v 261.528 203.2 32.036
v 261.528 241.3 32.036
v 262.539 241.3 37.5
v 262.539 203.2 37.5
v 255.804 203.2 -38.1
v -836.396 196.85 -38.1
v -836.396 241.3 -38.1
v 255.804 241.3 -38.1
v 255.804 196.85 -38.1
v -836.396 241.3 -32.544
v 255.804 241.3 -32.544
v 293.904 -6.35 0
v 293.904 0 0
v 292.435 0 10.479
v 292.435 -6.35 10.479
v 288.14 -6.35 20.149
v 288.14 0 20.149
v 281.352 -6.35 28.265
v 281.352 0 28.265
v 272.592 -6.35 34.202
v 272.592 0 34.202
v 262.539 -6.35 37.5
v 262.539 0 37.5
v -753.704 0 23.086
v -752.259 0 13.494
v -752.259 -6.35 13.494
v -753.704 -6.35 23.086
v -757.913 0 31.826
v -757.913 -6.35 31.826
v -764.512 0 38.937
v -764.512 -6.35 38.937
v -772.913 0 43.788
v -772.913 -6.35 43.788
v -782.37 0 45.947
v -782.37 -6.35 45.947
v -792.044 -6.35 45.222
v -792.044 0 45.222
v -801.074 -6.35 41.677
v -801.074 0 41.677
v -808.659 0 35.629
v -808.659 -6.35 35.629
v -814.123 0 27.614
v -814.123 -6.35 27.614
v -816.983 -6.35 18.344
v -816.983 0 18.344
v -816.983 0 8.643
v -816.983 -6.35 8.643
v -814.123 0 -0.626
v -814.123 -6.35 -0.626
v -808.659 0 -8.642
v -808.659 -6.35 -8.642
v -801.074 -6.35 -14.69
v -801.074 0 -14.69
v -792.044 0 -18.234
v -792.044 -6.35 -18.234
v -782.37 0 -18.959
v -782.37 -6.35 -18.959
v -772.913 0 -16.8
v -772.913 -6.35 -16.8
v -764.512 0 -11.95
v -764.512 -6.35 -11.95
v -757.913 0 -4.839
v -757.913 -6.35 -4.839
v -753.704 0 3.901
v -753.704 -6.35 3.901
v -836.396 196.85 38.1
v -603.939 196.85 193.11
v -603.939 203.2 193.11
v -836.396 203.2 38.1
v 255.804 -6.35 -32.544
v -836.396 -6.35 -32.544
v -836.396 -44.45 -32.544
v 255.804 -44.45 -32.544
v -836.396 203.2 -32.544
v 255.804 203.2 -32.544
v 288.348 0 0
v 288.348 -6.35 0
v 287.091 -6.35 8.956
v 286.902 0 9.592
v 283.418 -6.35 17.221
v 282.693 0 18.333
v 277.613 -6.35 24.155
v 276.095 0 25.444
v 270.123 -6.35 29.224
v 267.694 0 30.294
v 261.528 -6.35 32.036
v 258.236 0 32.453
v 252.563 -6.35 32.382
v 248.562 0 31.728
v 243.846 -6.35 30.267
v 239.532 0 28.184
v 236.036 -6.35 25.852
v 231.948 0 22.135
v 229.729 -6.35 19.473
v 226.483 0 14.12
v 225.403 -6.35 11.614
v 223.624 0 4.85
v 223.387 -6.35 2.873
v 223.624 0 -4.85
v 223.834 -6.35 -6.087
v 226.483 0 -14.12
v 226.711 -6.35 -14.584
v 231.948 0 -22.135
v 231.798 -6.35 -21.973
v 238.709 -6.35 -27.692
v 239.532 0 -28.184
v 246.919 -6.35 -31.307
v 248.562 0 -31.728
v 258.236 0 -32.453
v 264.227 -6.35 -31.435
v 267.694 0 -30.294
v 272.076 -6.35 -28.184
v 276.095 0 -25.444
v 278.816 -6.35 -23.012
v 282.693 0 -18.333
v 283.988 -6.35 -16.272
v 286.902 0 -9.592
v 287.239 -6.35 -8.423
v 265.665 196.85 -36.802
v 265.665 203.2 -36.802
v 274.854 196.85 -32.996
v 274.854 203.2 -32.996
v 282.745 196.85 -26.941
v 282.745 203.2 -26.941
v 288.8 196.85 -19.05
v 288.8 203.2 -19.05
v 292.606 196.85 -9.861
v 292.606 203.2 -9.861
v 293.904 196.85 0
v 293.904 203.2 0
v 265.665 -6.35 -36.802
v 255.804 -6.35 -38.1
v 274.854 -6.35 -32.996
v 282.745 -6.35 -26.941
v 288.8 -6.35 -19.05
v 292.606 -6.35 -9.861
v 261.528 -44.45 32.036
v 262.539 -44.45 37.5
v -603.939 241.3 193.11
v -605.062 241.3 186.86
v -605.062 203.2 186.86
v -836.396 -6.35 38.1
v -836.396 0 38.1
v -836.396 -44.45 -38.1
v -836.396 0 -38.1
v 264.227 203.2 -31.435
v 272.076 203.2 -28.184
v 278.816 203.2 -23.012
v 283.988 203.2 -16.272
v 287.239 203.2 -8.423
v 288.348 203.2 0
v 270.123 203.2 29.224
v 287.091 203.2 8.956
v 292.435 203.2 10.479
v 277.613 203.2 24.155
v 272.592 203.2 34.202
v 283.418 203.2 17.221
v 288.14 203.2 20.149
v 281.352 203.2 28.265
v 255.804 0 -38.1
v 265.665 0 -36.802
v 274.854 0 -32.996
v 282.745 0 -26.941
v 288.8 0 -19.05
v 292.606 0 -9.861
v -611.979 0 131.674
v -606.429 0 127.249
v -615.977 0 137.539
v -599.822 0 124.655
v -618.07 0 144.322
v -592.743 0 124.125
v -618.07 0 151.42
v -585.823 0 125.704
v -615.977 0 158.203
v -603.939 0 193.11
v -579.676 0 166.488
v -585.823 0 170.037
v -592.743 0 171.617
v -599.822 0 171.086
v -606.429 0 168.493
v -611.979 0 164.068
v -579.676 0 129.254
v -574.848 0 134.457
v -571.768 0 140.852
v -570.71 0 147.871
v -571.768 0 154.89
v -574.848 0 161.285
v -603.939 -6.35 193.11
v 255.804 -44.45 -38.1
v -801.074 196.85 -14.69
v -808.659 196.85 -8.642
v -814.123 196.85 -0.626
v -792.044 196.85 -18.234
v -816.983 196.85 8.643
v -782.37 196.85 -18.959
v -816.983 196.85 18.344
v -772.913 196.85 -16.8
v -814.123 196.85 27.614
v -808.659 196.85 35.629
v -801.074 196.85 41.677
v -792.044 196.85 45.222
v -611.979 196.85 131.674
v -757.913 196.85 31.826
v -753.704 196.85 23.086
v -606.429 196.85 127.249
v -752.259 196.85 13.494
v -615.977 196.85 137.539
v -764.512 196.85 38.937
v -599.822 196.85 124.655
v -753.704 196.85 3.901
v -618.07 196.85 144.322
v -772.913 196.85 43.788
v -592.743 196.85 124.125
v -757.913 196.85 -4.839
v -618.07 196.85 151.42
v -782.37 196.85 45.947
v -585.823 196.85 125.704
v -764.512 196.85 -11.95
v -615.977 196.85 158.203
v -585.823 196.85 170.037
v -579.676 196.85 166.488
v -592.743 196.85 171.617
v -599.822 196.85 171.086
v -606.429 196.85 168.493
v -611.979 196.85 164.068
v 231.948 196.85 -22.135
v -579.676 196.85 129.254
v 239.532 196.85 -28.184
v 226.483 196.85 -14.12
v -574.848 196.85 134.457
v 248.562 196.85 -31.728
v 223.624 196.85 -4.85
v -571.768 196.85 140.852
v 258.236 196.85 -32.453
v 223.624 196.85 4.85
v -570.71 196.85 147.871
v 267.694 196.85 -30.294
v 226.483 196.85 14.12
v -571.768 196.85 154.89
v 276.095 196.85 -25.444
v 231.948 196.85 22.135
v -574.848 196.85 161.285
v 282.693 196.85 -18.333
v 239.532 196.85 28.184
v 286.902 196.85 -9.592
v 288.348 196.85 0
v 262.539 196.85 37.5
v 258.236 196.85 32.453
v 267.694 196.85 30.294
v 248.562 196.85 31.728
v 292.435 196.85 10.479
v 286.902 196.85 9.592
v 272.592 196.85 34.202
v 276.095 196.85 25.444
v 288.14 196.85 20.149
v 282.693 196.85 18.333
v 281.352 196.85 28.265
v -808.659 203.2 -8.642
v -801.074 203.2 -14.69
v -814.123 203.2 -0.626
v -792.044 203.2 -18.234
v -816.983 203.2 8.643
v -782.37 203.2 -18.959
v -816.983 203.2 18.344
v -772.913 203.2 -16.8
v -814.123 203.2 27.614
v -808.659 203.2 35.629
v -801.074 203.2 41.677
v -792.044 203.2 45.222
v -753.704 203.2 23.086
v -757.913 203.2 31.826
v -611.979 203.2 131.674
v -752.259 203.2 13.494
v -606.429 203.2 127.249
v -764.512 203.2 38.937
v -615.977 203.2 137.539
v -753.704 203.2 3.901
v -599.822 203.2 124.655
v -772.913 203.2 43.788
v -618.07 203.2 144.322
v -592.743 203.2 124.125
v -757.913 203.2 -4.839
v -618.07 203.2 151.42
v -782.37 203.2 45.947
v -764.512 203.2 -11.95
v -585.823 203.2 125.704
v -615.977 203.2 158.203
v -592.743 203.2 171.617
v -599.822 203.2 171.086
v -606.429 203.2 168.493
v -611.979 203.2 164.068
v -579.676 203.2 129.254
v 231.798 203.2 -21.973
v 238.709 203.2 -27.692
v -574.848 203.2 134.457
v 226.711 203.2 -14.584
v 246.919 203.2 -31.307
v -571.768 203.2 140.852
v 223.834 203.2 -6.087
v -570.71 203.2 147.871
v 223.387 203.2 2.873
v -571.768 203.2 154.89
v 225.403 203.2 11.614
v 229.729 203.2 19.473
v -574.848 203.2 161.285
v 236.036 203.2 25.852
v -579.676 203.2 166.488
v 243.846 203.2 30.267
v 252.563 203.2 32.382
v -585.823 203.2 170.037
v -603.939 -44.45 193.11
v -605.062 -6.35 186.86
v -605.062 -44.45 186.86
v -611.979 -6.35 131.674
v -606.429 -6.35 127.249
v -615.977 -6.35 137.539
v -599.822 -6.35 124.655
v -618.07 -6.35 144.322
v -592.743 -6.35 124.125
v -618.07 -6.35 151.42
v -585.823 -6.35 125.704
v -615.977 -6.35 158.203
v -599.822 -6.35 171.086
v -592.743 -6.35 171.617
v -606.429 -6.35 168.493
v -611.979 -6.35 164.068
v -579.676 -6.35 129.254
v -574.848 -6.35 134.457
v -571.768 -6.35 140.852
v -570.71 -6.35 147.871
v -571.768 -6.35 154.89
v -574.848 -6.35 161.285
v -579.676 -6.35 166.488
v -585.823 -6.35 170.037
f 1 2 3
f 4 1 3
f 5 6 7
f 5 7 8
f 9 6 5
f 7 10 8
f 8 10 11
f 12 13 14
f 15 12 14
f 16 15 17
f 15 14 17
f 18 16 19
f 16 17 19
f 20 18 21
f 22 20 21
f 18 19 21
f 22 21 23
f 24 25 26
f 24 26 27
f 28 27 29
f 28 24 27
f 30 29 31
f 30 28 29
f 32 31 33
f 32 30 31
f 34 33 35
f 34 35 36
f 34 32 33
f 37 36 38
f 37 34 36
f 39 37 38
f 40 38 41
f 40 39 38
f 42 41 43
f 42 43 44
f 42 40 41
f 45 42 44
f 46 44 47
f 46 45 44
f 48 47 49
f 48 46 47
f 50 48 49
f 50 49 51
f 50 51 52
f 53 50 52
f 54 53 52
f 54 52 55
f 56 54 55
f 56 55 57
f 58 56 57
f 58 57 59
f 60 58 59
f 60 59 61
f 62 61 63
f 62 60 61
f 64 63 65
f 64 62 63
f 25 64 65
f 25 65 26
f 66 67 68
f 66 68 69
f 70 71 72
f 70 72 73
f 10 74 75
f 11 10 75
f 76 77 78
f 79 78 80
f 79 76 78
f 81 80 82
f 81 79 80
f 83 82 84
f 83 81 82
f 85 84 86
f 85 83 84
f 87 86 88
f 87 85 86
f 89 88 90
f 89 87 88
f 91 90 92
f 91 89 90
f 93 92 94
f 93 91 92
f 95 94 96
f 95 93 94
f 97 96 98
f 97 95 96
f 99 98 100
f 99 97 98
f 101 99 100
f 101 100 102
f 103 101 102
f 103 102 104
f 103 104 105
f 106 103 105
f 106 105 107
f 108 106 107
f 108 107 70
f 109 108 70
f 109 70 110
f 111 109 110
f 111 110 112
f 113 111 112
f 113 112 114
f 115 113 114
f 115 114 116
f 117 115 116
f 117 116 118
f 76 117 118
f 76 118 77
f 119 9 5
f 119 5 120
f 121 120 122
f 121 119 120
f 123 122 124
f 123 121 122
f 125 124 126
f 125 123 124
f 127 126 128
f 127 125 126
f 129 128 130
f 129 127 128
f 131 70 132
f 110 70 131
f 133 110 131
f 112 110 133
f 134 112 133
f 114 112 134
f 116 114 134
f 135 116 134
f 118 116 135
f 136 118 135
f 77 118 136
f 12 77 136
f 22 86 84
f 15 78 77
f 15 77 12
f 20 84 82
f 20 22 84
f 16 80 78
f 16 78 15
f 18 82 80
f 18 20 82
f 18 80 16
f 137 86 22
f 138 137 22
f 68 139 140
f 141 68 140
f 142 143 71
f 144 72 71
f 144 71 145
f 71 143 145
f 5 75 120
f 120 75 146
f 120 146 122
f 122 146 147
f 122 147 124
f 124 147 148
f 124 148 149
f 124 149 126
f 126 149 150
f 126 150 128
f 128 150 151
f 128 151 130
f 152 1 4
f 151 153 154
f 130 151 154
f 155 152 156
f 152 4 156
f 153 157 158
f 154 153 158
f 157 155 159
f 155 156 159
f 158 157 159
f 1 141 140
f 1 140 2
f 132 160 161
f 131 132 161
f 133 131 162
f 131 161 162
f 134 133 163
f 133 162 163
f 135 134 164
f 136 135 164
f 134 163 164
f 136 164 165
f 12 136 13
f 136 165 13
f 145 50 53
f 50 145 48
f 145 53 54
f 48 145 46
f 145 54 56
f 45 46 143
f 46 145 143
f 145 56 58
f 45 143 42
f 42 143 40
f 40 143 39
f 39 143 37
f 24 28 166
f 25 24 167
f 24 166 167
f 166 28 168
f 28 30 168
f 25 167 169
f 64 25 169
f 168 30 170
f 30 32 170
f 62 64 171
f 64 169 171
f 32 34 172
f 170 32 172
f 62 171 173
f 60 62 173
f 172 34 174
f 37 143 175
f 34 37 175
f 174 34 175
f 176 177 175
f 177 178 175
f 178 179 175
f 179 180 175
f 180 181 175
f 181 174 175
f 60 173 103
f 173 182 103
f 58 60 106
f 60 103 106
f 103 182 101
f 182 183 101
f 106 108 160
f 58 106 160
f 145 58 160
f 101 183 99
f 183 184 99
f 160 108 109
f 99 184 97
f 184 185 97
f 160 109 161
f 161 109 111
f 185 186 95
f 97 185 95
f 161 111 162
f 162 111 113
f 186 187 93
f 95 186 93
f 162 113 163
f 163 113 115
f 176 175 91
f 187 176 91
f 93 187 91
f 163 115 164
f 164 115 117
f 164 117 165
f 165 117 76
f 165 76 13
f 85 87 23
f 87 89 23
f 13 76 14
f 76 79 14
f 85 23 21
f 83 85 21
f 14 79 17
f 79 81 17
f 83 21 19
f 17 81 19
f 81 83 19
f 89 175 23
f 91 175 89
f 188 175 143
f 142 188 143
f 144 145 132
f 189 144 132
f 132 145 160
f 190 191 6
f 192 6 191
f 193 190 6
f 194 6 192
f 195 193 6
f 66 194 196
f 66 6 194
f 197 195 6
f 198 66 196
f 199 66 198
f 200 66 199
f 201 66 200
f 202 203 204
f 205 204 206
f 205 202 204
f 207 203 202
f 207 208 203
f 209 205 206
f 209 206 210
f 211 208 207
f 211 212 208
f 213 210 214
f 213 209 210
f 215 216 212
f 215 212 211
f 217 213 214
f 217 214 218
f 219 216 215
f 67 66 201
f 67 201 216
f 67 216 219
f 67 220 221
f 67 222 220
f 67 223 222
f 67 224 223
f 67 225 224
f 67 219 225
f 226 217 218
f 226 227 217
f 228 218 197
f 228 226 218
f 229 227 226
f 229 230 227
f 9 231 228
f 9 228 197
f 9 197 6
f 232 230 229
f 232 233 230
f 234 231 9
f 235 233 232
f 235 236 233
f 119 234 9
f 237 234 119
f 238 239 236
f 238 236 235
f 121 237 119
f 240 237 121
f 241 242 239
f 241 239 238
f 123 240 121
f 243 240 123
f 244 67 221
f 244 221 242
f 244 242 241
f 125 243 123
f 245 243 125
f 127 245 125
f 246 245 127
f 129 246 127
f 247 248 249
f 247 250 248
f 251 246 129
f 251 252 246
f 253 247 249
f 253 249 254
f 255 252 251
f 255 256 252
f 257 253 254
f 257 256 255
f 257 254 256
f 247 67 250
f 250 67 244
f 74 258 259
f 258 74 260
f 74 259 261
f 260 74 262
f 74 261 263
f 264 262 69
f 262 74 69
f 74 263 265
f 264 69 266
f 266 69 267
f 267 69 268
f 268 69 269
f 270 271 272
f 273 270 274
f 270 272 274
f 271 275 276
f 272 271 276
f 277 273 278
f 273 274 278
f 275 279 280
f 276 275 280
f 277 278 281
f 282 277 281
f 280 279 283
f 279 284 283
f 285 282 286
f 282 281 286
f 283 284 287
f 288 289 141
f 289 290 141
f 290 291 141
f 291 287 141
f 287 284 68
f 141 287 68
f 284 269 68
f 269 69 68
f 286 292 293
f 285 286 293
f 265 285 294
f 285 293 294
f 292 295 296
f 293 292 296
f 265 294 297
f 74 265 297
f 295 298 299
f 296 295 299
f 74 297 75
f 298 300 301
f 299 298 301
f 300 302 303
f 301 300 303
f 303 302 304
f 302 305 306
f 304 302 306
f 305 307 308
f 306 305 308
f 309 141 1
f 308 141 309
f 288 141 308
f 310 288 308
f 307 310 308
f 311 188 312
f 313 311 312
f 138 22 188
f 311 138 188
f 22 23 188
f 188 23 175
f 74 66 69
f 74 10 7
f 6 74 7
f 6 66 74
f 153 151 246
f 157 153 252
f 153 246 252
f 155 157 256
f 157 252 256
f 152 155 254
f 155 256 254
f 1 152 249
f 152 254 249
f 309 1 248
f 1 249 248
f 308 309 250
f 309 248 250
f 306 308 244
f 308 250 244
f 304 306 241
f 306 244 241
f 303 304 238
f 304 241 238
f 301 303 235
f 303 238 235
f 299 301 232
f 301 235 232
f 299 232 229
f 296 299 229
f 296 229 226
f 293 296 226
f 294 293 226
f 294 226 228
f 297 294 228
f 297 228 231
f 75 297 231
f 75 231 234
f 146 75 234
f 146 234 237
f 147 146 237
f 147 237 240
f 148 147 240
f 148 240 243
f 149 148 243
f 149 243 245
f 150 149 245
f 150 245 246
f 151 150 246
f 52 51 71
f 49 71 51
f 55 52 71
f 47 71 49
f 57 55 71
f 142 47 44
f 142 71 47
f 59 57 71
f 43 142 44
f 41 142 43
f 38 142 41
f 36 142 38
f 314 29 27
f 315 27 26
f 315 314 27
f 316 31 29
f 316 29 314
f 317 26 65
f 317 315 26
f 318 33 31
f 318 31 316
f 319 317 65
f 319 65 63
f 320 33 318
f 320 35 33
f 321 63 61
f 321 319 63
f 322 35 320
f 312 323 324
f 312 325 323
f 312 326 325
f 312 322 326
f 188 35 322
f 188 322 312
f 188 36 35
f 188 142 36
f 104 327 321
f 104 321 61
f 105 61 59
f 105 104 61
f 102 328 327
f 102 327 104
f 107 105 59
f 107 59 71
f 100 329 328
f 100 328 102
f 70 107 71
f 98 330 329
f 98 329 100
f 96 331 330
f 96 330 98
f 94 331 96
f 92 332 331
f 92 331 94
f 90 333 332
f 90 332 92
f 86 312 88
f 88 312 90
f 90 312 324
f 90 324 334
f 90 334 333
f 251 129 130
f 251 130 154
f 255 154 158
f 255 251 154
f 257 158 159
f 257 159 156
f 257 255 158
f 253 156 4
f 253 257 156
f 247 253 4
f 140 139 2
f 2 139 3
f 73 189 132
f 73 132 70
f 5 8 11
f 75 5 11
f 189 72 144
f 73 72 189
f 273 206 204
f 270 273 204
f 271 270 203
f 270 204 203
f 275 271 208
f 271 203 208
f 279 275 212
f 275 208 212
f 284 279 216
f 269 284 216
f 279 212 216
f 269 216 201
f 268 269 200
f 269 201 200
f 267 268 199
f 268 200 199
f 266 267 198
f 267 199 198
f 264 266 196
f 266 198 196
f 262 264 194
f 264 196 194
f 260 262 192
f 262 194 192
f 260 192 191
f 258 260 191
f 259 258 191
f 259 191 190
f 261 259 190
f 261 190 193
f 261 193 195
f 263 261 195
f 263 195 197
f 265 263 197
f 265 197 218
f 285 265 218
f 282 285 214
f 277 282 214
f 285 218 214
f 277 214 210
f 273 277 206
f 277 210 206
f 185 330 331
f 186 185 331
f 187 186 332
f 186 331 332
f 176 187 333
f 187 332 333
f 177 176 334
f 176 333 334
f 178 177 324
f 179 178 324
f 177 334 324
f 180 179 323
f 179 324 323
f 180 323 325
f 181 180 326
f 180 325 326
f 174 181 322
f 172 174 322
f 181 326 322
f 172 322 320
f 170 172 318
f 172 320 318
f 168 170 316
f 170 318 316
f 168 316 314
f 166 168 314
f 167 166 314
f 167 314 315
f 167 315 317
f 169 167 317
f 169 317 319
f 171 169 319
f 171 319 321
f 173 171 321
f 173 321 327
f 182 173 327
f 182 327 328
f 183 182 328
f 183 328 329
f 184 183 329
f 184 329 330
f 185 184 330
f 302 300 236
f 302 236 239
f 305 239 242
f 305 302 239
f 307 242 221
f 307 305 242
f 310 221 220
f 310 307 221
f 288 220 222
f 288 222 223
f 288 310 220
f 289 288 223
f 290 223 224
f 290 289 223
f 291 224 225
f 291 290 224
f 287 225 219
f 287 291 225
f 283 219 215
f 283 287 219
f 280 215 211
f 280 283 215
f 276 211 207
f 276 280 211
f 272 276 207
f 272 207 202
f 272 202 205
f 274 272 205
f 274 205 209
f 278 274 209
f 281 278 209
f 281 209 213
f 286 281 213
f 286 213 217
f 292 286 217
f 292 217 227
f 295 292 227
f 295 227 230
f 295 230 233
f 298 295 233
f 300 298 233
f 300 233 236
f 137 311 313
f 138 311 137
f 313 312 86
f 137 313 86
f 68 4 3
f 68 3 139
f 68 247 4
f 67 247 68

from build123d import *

# Parameters (mm, degrees)
F0_R          = 32.54375
F1_DEPTH      = 6.35
F2_R          = 23.8125
F2_W          = 1092.2
F2_H          = 5.55625
F3_DEPTH      = 38.1
F4_DEPTH      = 25.4
F4_DEPTH_BACK = 76.2


with BuildPart() as f1:
    # F0 (on Front) → F1 (new body)
    with BuildSketch(Plane.XZ):
        with BuildLine():
            ThreePointArc((255.8039750737, -38.1), (217.8542547268, 3.3806398206), (262.538585876, 37.5000668978))
            Line((262.538585876, 37.5000668978), (-603.9391503229, 193.1101978891))
            Line((-603.9391503229, 193.1101978891), (-836.3960249263, 38.1))
            Line((-836.3960249263, 38.1), (-836.3960249263, -38.1))
            Line((-836.3960249263, -38.1), (255.8039750737, -38.1))
        make_face()
        with Locations((-784.8022749263, 13.49375)):
            Circle(F0_R, mode=Mode.SUBTRACT)
        with BuildLine():
            ThreePointArc((255.8039750737, -38.1), (282.7447434369, -26.9407683632), (293.9039750737, 0))
            ThreePointArc((293.9039750737, 0), (285.0289530169, 24.4440312595), (262.538585876, 37.5000668978))
            ThreePointArc((262.538585876, 37.5000668978), (217.8542547268, 3.3806398206), (255.8039750737, -38.1))
        make_face()
        with Locations((255.8039750737, 0)):
            Circle(F0_R, mode=Mode.SUBTRACT)
    extrude(amount=F1_DEPTH)

    # F2 (on face) → F3 (join)
    with BuildSketch(Plane.XZ.offset(6.35)):
        with Locations((-594.5229711201, 147.8709305353)):
            Circle(F2_R)
        Polygon((262.538585876, 37.5000668978), (-603.9391503229, 193.1101978891), (-605.0615854567, 186.8601867395), (261.5275716032, 32.0364808746), align=None)
        with Locations((-290.2960249263, -35.321875)):
            Rectangle(F2_W, F2_H)
    extrude(amount=F3_DEPTH)

    # F2 (on face) → F4 (cut, two sides)
    with BuildSketch(Plane.XZ.offset(6.35)) as f4_sk:
        with Locations((-594.5229711201, 147.8709305353)):
            Circle(F2_R)
    extrude(amount=-F4_DEPTH, mode=Mode.SUBTRACT)
    extrude(f4_sk.sketch, amount=F4_DEPTH_BACK, mode=Mode.SUBTRACT)


with BuildPart() as f6_1:
    # F6: instance of F1
    add(f1.part.mirror(Plane(origin=(-334.3061956404, 98.425, 45.1552498407), x_dir=(1, 0, 0), z_dir=(0, 1, 0))))


solid = Compound([f1.part, f6_1.part])
